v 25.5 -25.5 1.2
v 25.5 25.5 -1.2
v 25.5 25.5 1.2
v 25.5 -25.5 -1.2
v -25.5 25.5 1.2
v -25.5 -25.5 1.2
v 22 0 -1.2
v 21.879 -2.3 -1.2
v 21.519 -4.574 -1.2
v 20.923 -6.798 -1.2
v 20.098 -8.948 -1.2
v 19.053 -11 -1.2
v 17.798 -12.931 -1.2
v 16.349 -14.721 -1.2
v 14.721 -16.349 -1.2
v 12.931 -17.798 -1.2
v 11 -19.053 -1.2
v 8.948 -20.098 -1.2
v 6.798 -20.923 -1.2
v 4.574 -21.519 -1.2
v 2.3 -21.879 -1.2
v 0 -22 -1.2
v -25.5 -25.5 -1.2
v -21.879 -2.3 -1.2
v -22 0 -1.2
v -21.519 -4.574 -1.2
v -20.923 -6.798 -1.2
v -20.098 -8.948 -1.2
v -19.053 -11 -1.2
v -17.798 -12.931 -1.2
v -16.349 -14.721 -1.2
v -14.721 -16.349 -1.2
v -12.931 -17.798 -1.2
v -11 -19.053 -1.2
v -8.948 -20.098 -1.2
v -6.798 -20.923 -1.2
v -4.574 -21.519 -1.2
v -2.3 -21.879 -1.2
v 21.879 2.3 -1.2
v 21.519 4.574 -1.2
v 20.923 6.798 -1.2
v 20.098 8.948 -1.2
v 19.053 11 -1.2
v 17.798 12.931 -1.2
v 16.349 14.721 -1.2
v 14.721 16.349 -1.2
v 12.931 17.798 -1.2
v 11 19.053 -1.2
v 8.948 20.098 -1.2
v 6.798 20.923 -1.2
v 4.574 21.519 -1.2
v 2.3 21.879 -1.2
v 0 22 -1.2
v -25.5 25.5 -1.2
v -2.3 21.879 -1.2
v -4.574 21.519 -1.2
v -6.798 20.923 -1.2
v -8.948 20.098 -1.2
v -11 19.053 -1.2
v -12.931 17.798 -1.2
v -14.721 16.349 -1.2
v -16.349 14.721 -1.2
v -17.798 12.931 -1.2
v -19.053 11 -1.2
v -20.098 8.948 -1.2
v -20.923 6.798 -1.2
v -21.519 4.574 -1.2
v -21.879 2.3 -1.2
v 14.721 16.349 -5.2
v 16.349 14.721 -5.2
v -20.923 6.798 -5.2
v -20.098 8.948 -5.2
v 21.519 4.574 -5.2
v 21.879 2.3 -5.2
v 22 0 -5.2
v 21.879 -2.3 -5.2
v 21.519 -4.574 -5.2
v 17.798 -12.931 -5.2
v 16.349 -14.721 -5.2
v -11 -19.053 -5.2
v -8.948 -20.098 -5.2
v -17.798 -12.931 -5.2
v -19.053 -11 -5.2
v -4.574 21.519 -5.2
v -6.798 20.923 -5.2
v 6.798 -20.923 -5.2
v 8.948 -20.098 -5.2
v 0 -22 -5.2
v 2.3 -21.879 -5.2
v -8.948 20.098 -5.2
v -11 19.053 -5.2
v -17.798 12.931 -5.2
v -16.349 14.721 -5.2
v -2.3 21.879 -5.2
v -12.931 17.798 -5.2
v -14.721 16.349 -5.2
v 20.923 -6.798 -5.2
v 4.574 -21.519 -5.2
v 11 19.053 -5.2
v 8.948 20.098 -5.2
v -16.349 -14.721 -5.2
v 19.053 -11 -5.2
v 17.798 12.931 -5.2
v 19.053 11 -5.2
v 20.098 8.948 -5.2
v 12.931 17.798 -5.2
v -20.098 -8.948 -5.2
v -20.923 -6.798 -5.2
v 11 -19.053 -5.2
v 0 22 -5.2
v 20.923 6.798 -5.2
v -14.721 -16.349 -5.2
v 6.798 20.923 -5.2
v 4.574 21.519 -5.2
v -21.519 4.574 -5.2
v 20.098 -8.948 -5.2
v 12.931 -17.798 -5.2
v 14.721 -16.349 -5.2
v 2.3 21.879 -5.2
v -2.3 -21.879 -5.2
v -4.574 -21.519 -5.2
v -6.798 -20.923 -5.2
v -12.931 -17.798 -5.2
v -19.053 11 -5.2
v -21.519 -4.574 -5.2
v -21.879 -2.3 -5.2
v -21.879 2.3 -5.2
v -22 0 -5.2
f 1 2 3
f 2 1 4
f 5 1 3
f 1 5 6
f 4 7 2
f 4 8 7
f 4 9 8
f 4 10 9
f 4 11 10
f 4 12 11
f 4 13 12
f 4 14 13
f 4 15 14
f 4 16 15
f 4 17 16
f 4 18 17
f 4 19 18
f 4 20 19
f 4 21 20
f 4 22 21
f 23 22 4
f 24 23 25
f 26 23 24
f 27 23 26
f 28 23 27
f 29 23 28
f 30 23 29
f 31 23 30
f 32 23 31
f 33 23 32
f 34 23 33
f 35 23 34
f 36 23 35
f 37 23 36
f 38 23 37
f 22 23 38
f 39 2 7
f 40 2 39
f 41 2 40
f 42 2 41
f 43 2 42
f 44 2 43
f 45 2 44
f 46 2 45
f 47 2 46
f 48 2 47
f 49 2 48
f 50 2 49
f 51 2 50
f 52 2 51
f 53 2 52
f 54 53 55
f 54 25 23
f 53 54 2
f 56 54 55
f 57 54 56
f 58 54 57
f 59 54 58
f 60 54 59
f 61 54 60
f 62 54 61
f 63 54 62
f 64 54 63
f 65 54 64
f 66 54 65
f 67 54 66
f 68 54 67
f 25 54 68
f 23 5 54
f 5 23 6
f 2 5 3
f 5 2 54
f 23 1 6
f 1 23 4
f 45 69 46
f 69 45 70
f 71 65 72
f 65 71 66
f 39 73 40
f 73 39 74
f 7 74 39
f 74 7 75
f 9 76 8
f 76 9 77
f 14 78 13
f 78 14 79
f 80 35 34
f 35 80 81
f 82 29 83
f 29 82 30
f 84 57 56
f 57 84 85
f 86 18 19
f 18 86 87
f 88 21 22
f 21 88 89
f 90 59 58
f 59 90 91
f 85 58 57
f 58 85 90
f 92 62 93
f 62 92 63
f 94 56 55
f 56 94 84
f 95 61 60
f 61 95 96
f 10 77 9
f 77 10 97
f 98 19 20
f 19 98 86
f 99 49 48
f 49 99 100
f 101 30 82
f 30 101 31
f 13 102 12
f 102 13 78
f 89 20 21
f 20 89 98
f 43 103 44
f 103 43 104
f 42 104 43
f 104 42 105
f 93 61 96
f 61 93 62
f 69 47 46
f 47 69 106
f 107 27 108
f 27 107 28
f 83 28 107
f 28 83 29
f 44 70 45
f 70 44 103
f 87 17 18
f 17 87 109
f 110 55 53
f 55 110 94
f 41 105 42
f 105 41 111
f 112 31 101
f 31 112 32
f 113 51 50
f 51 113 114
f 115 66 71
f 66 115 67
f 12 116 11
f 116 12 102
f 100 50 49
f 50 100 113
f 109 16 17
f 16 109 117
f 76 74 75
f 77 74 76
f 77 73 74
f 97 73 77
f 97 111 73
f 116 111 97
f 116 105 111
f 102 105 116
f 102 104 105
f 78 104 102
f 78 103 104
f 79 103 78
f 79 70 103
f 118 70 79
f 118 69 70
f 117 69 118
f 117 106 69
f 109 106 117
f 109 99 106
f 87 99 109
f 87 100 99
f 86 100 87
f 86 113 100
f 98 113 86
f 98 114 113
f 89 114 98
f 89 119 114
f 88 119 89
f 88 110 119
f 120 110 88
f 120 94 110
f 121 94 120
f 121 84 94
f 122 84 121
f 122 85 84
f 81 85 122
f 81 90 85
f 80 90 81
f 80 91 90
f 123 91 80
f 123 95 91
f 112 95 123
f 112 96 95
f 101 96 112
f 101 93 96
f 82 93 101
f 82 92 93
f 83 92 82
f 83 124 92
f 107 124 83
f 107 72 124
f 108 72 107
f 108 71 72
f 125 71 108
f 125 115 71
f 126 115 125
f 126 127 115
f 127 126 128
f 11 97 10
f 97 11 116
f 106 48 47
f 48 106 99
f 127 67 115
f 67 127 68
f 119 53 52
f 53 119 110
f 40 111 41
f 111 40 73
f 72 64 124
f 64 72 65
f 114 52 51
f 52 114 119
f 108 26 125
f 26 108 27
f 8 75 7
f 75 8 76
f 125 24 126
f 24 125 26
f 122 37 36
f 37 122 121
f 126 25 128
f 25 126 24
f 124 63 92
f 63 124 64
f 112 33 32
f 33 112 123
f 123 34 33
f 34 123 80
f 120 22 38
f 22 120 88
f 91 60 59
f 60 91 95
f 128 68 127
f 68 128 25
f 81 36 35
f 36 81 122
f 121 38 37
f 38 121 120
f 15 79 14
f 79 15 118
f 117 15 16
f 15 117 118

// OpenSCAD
// Press-fit end cap for 50 mm extrusion.
$fn = 60;
eps = 0.02;
profile = 50;
cap_t = 2.4;
wall = 3;
pin_d = profile - 2 * wall;
pin_l = 4;
union() {
    cube([profile + 1, profile + 1, cap_t], center = true);
    translate([0, 0, -cap_t / 2 - pin_l]) cylinder(d = pin_d, h = pin_l + eps);
}
